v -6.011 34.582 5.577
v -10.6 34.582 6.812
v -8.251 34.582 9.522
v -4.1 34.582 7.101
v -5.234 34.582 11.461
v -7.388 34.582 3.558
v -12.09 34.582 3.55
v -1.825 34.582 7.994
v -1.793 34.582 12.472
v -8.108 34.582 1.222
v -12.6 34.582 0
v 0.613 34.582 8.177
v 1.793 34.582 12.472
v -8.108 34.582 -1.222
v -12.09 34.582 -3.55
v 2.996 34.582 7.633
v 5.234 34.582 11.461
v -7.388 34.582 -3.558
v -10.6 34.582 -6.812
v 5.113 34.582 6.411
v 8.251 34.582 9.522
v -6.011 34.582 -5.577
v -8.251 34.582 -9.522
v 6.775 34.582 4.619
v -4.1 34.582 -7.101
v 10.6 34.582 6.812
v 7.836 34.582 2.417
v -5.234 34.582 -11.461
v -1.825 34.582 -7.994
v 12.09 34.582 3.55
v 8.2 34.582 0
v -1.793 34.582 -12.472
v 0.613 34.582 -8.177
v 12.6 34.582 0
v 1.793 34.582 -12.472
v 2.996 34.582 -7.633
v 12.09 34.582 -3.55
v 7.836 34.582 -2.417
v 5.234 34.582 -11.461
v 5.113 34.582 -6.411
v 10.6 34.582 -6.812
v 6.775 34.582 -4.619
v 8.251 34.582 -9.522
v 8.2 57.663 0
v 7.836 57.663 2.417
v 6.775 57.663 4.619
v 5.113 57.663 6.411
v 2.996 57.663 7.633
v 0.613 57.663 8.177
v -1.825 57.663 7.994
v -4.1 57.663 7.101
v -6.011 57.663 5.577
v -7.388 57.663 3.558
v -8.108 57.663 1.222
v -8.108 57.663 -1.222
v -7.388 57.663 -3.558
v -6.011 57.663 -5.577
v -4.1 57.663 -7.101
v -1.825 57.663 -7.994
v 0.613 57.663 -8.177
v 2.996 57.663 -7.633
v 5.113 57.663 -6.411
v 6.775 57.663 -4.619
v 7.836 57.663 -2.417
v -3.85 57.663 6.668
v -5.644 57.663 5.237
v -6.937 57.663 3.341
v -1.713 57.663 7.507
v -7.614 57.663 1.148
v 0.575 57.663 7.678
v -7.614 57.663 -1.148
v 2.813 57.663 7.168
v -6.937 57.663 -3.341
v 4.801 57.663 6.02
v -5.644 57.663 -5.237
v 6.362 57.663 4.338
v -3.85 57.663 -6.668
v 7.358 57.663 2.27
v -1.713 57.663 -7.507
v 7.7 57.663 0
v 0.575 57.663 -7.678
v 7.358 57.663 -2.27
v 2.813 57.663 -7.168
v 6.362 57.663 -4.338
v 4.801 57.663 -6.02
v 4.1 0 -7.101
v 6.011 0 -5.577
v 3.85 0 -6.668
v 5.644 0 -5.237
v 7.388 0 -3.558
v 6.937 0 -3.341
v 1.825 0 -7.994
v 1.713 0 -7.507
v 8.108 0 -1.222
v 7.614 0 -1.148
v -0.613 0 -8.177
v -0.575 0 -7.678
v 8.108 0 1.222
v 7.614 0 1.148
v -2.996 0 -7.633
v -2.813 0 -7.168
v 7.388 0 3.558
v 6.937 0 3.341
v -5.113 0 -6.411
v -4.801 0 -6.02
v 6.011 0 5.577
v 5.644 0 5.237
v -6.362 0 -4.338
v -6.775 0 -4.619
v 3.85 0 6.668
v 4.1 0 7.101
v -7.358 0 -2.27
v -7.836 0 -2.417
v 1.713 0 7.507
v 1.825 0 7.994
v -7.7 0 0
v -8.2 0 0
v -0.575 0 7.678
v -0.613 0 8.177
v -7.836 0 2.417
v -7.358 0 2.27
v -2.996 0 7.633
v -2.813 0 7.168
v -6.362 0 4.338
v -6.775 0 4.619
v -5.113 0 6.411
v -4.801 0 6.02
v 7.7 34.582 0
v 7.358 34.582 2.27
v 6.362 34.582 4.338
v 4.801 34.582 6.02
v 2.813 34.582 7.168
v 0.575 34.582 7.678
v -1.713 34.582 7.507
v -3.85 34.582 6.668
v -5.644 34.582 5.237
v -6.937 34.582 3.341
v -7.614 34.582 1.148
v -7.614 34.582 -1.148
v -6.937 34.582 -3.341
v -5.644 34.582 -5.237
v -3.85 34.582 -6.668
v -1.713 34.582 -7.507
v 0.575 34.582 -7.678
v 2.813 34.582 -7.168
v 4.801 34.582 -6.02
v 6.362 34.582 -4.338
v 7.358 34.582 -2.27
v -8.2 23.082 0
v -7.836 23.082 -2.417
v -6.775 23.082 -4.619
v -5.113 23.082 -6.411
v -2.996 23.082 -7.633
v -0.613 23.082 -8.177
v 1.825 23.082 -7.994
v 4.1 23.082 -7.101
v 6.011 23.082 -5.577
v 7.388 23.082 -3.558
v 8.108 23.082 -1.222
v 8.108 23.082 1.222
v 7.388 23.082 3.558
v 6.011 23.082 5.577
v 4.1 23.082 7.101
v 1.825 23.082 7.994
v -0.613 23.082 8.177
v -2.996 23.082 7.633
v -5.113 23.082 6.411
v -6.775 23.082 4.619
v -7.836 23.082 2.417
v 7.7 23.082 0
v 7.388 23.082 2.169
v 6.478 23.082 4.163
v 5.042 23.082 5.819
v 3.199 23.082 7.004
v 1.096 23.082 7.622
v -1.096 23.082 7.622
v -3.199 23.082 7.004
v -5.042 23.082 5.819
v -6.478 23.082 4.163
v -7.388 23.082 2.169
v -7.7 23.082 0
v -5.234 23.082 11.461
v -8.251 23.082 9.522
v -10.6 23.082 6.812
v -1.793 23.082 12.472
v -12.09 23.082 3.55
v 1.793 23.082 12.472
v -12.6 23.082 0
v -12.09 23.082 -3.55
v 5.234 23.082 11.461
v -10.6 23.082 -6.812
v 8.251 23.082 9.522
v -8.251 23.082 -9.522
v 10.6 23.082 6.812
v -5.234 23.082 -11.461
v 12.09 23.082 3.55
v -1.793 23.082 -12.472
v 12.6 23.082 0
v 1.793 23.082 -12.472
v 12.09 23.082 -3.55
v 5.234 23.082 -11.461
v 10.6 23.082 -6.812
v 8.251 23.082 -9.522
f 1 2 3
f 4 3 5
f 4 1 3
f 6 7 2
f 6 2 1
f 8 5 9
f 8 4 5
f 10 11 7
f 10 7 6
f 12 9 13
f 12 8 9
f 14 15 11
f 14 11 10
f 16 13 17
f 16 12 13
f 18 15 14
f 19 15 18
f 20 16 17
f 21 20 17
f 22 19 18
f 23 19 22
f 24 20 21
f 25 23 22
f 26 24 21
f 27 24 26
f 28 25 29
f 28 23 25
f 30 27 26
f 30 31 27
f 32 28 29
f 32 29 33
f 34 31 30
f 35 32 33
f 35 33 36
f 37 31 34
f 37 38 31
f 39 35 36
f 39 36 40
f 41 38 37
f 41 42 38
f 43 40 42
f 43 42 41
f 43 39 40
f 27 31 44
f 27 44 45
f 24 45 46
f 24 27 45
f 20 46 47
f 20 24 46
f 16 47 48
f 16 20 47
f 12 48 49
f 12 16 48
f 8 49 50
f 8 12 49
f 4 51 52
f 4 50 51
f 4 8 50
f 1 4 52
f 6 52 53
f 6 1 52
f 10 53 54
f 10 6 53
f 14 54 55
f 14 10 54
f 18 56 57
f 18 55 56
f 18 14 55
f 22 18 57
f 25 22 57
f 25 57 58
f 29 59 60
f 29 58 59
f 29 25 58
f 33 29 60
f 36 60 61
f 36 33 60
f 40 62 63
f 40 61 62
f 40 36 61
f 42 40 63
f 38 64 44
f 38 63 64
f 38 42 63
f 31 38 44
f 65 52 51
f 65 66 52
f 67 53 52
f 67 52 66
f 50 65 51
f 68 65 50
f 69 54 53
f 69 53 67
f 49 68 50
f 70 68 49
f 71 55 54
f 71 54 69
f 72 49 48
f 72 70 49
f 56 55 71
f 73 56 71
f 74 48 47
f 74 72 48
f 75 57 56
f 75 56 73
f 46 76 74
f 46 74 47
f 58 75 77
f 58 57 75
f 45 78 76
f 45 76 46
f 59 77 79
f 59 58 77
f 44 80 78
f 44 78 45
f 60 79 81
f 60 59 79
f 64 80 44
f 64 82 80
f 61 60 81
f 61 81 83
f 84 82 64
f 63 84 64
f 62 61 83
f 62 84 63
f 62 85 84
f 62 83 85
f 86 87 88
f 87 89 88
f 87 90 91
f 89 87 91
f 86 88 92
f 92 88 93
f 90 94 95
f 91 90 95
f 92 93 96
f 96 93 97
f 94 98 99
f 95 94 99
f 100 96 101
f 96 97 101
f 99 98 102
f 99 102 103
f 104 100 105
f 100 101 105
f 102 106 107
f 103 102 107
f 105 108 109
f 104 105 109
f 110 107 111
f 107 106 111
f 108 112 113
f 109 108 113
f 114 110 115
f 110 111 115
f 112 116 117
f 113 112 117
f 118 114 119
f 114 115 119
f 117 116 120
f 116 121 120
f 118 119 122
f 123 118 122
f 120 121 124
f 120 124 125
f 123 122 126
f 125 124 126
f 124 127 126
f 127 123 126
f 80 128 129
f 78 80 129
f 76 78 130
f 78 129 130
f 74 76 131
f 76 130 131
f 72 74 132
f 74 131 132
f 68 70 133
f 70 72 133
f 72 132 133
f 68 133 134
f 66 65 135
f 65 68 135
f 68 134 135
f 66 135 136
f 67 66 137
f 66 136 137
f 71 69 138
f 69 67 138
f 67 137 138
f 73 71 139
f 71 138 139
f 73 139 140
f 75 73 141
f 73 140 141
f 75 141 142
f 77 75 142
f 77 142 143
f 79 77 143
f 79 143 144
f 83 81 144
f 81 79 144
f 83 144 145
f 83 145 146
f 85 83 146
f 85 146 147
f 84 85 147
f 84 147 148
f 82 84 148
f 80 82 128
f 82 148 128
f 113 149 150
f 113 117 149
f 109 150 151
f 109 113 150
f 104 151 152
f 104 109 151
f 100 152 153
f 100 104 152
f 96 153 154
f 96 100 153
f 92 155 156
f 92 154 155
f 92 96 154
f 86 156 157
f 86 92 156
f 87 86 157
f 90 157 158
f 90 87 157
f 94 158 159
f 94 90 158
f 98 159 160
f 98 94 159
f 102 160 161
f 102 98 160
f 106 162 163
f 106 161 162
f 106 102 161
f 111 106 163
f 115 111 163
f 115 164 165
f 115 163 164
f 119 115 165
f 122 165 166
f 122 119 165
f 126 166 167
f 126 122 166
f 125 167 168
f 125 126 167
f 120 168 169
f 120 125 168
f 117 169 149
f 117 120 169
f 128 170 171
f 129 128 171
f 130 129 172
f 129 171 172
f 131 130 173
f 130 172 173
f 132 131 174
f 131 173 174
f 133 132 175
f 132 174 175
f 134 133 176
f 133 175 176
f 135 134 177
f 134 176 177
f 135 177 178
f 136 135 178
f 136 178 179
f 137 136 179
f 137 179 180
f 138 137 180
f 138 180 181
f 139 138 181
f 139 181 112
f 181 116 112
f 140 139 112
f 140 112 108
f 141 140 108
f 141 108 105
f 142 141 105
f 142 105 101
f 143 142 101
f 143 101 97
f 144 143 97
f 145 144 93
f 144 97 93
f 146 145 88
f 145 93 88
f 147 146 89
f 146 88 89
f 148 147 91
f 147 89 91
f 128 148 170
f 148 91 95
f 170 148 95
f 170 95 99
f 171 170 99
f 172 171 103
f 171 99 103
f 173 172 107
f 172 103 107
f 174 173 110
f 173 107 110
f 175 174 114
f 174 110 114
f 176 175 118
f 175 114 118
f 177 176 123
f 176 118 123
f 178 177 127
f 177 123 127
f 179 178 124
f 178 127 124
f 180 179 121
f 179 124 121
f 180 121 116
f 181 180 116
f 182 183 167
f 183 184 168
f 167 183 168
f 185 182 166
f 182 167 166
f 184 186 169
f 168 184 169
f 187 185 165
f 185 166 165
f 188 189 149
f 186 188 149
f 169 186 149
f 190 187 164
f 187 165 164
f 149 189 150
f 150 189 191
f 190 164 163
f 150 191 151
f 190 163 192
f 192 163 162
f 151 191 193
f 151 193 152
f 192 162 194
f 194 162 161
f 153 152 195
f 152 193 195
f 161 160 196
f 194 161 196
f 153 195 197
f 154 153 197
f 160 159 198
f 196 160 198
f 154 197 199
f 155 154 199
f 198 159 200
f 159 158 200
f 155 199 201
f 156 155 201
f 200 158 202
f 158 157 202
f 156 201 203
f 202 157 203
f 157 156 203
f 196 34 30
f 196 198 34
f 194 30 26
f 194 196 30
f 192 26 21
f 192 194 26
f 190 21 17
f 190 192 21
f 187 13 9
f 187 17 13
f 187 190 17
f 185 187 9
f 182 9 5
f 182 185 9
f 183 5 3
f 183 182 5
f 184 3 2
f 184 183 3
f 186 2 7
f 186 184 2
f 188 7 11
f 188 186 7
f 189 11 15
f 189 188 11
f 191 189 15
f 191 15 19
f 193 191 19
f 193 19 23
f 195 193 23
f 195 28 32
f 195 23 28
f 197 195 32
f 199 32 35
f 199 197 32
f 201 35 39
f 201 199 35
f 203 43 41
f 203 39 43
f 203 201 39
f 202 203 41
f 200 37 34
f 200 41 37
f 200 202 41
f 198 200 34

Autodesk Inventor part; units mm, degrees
ref_plane "YZ Plane" through (0, 0, 0) normal (1, 0, 0) x (0, 1, 0)
ref_plane "XZ Plane" through (0, 0, 0) normal (0, 1, 0) x (-1, 0, 0)
ref_plane "XY Plane" through (0, 0, 0) normal (0, 0, 1) x (1, 0, 0)
sketch "Sketch1" plane through (0, 0, 0) normal (0, 1, 0) x (-1, 0, 0)
  circle A0 centre (0, 0) radius 7.7
  circle A1 centre (0, 0) radius 8.2
  dimension "d0" = 15.4
  dimension "d1" = 16.4
extrude "Extrusion1" add sketch "Sketch1" along normal blind 23.0816
sketch "Sketch2" plane through (0, 23.0816, 0) normal (0, 1, 0) x (1, 0, 0)
  circle A0 centre (0, 0) radius 12.6
  circle A1 centre (0, 0) radius 7.7 projected
  dimension "d4" = 25.2
extrude "Extrusion2" add sketch "Sketch2" along normal blind 11.5
sketch "Sketch3" plane through (0, 34.5816, 0) normal (0, 1, 0) x (1, 0, 0)
  circle A0 centre (0, 0) radius 8.2 projected
  circle A1 centre (0, 0) radius 7.7 projected
extrude "Extrusion3" add sketch "Sketch3" along normal blind 23.0816
equation "\"delta\" = 7.0816"
properties part number "ICF34_Ceramic" material "Stainless Steel, 440C"
